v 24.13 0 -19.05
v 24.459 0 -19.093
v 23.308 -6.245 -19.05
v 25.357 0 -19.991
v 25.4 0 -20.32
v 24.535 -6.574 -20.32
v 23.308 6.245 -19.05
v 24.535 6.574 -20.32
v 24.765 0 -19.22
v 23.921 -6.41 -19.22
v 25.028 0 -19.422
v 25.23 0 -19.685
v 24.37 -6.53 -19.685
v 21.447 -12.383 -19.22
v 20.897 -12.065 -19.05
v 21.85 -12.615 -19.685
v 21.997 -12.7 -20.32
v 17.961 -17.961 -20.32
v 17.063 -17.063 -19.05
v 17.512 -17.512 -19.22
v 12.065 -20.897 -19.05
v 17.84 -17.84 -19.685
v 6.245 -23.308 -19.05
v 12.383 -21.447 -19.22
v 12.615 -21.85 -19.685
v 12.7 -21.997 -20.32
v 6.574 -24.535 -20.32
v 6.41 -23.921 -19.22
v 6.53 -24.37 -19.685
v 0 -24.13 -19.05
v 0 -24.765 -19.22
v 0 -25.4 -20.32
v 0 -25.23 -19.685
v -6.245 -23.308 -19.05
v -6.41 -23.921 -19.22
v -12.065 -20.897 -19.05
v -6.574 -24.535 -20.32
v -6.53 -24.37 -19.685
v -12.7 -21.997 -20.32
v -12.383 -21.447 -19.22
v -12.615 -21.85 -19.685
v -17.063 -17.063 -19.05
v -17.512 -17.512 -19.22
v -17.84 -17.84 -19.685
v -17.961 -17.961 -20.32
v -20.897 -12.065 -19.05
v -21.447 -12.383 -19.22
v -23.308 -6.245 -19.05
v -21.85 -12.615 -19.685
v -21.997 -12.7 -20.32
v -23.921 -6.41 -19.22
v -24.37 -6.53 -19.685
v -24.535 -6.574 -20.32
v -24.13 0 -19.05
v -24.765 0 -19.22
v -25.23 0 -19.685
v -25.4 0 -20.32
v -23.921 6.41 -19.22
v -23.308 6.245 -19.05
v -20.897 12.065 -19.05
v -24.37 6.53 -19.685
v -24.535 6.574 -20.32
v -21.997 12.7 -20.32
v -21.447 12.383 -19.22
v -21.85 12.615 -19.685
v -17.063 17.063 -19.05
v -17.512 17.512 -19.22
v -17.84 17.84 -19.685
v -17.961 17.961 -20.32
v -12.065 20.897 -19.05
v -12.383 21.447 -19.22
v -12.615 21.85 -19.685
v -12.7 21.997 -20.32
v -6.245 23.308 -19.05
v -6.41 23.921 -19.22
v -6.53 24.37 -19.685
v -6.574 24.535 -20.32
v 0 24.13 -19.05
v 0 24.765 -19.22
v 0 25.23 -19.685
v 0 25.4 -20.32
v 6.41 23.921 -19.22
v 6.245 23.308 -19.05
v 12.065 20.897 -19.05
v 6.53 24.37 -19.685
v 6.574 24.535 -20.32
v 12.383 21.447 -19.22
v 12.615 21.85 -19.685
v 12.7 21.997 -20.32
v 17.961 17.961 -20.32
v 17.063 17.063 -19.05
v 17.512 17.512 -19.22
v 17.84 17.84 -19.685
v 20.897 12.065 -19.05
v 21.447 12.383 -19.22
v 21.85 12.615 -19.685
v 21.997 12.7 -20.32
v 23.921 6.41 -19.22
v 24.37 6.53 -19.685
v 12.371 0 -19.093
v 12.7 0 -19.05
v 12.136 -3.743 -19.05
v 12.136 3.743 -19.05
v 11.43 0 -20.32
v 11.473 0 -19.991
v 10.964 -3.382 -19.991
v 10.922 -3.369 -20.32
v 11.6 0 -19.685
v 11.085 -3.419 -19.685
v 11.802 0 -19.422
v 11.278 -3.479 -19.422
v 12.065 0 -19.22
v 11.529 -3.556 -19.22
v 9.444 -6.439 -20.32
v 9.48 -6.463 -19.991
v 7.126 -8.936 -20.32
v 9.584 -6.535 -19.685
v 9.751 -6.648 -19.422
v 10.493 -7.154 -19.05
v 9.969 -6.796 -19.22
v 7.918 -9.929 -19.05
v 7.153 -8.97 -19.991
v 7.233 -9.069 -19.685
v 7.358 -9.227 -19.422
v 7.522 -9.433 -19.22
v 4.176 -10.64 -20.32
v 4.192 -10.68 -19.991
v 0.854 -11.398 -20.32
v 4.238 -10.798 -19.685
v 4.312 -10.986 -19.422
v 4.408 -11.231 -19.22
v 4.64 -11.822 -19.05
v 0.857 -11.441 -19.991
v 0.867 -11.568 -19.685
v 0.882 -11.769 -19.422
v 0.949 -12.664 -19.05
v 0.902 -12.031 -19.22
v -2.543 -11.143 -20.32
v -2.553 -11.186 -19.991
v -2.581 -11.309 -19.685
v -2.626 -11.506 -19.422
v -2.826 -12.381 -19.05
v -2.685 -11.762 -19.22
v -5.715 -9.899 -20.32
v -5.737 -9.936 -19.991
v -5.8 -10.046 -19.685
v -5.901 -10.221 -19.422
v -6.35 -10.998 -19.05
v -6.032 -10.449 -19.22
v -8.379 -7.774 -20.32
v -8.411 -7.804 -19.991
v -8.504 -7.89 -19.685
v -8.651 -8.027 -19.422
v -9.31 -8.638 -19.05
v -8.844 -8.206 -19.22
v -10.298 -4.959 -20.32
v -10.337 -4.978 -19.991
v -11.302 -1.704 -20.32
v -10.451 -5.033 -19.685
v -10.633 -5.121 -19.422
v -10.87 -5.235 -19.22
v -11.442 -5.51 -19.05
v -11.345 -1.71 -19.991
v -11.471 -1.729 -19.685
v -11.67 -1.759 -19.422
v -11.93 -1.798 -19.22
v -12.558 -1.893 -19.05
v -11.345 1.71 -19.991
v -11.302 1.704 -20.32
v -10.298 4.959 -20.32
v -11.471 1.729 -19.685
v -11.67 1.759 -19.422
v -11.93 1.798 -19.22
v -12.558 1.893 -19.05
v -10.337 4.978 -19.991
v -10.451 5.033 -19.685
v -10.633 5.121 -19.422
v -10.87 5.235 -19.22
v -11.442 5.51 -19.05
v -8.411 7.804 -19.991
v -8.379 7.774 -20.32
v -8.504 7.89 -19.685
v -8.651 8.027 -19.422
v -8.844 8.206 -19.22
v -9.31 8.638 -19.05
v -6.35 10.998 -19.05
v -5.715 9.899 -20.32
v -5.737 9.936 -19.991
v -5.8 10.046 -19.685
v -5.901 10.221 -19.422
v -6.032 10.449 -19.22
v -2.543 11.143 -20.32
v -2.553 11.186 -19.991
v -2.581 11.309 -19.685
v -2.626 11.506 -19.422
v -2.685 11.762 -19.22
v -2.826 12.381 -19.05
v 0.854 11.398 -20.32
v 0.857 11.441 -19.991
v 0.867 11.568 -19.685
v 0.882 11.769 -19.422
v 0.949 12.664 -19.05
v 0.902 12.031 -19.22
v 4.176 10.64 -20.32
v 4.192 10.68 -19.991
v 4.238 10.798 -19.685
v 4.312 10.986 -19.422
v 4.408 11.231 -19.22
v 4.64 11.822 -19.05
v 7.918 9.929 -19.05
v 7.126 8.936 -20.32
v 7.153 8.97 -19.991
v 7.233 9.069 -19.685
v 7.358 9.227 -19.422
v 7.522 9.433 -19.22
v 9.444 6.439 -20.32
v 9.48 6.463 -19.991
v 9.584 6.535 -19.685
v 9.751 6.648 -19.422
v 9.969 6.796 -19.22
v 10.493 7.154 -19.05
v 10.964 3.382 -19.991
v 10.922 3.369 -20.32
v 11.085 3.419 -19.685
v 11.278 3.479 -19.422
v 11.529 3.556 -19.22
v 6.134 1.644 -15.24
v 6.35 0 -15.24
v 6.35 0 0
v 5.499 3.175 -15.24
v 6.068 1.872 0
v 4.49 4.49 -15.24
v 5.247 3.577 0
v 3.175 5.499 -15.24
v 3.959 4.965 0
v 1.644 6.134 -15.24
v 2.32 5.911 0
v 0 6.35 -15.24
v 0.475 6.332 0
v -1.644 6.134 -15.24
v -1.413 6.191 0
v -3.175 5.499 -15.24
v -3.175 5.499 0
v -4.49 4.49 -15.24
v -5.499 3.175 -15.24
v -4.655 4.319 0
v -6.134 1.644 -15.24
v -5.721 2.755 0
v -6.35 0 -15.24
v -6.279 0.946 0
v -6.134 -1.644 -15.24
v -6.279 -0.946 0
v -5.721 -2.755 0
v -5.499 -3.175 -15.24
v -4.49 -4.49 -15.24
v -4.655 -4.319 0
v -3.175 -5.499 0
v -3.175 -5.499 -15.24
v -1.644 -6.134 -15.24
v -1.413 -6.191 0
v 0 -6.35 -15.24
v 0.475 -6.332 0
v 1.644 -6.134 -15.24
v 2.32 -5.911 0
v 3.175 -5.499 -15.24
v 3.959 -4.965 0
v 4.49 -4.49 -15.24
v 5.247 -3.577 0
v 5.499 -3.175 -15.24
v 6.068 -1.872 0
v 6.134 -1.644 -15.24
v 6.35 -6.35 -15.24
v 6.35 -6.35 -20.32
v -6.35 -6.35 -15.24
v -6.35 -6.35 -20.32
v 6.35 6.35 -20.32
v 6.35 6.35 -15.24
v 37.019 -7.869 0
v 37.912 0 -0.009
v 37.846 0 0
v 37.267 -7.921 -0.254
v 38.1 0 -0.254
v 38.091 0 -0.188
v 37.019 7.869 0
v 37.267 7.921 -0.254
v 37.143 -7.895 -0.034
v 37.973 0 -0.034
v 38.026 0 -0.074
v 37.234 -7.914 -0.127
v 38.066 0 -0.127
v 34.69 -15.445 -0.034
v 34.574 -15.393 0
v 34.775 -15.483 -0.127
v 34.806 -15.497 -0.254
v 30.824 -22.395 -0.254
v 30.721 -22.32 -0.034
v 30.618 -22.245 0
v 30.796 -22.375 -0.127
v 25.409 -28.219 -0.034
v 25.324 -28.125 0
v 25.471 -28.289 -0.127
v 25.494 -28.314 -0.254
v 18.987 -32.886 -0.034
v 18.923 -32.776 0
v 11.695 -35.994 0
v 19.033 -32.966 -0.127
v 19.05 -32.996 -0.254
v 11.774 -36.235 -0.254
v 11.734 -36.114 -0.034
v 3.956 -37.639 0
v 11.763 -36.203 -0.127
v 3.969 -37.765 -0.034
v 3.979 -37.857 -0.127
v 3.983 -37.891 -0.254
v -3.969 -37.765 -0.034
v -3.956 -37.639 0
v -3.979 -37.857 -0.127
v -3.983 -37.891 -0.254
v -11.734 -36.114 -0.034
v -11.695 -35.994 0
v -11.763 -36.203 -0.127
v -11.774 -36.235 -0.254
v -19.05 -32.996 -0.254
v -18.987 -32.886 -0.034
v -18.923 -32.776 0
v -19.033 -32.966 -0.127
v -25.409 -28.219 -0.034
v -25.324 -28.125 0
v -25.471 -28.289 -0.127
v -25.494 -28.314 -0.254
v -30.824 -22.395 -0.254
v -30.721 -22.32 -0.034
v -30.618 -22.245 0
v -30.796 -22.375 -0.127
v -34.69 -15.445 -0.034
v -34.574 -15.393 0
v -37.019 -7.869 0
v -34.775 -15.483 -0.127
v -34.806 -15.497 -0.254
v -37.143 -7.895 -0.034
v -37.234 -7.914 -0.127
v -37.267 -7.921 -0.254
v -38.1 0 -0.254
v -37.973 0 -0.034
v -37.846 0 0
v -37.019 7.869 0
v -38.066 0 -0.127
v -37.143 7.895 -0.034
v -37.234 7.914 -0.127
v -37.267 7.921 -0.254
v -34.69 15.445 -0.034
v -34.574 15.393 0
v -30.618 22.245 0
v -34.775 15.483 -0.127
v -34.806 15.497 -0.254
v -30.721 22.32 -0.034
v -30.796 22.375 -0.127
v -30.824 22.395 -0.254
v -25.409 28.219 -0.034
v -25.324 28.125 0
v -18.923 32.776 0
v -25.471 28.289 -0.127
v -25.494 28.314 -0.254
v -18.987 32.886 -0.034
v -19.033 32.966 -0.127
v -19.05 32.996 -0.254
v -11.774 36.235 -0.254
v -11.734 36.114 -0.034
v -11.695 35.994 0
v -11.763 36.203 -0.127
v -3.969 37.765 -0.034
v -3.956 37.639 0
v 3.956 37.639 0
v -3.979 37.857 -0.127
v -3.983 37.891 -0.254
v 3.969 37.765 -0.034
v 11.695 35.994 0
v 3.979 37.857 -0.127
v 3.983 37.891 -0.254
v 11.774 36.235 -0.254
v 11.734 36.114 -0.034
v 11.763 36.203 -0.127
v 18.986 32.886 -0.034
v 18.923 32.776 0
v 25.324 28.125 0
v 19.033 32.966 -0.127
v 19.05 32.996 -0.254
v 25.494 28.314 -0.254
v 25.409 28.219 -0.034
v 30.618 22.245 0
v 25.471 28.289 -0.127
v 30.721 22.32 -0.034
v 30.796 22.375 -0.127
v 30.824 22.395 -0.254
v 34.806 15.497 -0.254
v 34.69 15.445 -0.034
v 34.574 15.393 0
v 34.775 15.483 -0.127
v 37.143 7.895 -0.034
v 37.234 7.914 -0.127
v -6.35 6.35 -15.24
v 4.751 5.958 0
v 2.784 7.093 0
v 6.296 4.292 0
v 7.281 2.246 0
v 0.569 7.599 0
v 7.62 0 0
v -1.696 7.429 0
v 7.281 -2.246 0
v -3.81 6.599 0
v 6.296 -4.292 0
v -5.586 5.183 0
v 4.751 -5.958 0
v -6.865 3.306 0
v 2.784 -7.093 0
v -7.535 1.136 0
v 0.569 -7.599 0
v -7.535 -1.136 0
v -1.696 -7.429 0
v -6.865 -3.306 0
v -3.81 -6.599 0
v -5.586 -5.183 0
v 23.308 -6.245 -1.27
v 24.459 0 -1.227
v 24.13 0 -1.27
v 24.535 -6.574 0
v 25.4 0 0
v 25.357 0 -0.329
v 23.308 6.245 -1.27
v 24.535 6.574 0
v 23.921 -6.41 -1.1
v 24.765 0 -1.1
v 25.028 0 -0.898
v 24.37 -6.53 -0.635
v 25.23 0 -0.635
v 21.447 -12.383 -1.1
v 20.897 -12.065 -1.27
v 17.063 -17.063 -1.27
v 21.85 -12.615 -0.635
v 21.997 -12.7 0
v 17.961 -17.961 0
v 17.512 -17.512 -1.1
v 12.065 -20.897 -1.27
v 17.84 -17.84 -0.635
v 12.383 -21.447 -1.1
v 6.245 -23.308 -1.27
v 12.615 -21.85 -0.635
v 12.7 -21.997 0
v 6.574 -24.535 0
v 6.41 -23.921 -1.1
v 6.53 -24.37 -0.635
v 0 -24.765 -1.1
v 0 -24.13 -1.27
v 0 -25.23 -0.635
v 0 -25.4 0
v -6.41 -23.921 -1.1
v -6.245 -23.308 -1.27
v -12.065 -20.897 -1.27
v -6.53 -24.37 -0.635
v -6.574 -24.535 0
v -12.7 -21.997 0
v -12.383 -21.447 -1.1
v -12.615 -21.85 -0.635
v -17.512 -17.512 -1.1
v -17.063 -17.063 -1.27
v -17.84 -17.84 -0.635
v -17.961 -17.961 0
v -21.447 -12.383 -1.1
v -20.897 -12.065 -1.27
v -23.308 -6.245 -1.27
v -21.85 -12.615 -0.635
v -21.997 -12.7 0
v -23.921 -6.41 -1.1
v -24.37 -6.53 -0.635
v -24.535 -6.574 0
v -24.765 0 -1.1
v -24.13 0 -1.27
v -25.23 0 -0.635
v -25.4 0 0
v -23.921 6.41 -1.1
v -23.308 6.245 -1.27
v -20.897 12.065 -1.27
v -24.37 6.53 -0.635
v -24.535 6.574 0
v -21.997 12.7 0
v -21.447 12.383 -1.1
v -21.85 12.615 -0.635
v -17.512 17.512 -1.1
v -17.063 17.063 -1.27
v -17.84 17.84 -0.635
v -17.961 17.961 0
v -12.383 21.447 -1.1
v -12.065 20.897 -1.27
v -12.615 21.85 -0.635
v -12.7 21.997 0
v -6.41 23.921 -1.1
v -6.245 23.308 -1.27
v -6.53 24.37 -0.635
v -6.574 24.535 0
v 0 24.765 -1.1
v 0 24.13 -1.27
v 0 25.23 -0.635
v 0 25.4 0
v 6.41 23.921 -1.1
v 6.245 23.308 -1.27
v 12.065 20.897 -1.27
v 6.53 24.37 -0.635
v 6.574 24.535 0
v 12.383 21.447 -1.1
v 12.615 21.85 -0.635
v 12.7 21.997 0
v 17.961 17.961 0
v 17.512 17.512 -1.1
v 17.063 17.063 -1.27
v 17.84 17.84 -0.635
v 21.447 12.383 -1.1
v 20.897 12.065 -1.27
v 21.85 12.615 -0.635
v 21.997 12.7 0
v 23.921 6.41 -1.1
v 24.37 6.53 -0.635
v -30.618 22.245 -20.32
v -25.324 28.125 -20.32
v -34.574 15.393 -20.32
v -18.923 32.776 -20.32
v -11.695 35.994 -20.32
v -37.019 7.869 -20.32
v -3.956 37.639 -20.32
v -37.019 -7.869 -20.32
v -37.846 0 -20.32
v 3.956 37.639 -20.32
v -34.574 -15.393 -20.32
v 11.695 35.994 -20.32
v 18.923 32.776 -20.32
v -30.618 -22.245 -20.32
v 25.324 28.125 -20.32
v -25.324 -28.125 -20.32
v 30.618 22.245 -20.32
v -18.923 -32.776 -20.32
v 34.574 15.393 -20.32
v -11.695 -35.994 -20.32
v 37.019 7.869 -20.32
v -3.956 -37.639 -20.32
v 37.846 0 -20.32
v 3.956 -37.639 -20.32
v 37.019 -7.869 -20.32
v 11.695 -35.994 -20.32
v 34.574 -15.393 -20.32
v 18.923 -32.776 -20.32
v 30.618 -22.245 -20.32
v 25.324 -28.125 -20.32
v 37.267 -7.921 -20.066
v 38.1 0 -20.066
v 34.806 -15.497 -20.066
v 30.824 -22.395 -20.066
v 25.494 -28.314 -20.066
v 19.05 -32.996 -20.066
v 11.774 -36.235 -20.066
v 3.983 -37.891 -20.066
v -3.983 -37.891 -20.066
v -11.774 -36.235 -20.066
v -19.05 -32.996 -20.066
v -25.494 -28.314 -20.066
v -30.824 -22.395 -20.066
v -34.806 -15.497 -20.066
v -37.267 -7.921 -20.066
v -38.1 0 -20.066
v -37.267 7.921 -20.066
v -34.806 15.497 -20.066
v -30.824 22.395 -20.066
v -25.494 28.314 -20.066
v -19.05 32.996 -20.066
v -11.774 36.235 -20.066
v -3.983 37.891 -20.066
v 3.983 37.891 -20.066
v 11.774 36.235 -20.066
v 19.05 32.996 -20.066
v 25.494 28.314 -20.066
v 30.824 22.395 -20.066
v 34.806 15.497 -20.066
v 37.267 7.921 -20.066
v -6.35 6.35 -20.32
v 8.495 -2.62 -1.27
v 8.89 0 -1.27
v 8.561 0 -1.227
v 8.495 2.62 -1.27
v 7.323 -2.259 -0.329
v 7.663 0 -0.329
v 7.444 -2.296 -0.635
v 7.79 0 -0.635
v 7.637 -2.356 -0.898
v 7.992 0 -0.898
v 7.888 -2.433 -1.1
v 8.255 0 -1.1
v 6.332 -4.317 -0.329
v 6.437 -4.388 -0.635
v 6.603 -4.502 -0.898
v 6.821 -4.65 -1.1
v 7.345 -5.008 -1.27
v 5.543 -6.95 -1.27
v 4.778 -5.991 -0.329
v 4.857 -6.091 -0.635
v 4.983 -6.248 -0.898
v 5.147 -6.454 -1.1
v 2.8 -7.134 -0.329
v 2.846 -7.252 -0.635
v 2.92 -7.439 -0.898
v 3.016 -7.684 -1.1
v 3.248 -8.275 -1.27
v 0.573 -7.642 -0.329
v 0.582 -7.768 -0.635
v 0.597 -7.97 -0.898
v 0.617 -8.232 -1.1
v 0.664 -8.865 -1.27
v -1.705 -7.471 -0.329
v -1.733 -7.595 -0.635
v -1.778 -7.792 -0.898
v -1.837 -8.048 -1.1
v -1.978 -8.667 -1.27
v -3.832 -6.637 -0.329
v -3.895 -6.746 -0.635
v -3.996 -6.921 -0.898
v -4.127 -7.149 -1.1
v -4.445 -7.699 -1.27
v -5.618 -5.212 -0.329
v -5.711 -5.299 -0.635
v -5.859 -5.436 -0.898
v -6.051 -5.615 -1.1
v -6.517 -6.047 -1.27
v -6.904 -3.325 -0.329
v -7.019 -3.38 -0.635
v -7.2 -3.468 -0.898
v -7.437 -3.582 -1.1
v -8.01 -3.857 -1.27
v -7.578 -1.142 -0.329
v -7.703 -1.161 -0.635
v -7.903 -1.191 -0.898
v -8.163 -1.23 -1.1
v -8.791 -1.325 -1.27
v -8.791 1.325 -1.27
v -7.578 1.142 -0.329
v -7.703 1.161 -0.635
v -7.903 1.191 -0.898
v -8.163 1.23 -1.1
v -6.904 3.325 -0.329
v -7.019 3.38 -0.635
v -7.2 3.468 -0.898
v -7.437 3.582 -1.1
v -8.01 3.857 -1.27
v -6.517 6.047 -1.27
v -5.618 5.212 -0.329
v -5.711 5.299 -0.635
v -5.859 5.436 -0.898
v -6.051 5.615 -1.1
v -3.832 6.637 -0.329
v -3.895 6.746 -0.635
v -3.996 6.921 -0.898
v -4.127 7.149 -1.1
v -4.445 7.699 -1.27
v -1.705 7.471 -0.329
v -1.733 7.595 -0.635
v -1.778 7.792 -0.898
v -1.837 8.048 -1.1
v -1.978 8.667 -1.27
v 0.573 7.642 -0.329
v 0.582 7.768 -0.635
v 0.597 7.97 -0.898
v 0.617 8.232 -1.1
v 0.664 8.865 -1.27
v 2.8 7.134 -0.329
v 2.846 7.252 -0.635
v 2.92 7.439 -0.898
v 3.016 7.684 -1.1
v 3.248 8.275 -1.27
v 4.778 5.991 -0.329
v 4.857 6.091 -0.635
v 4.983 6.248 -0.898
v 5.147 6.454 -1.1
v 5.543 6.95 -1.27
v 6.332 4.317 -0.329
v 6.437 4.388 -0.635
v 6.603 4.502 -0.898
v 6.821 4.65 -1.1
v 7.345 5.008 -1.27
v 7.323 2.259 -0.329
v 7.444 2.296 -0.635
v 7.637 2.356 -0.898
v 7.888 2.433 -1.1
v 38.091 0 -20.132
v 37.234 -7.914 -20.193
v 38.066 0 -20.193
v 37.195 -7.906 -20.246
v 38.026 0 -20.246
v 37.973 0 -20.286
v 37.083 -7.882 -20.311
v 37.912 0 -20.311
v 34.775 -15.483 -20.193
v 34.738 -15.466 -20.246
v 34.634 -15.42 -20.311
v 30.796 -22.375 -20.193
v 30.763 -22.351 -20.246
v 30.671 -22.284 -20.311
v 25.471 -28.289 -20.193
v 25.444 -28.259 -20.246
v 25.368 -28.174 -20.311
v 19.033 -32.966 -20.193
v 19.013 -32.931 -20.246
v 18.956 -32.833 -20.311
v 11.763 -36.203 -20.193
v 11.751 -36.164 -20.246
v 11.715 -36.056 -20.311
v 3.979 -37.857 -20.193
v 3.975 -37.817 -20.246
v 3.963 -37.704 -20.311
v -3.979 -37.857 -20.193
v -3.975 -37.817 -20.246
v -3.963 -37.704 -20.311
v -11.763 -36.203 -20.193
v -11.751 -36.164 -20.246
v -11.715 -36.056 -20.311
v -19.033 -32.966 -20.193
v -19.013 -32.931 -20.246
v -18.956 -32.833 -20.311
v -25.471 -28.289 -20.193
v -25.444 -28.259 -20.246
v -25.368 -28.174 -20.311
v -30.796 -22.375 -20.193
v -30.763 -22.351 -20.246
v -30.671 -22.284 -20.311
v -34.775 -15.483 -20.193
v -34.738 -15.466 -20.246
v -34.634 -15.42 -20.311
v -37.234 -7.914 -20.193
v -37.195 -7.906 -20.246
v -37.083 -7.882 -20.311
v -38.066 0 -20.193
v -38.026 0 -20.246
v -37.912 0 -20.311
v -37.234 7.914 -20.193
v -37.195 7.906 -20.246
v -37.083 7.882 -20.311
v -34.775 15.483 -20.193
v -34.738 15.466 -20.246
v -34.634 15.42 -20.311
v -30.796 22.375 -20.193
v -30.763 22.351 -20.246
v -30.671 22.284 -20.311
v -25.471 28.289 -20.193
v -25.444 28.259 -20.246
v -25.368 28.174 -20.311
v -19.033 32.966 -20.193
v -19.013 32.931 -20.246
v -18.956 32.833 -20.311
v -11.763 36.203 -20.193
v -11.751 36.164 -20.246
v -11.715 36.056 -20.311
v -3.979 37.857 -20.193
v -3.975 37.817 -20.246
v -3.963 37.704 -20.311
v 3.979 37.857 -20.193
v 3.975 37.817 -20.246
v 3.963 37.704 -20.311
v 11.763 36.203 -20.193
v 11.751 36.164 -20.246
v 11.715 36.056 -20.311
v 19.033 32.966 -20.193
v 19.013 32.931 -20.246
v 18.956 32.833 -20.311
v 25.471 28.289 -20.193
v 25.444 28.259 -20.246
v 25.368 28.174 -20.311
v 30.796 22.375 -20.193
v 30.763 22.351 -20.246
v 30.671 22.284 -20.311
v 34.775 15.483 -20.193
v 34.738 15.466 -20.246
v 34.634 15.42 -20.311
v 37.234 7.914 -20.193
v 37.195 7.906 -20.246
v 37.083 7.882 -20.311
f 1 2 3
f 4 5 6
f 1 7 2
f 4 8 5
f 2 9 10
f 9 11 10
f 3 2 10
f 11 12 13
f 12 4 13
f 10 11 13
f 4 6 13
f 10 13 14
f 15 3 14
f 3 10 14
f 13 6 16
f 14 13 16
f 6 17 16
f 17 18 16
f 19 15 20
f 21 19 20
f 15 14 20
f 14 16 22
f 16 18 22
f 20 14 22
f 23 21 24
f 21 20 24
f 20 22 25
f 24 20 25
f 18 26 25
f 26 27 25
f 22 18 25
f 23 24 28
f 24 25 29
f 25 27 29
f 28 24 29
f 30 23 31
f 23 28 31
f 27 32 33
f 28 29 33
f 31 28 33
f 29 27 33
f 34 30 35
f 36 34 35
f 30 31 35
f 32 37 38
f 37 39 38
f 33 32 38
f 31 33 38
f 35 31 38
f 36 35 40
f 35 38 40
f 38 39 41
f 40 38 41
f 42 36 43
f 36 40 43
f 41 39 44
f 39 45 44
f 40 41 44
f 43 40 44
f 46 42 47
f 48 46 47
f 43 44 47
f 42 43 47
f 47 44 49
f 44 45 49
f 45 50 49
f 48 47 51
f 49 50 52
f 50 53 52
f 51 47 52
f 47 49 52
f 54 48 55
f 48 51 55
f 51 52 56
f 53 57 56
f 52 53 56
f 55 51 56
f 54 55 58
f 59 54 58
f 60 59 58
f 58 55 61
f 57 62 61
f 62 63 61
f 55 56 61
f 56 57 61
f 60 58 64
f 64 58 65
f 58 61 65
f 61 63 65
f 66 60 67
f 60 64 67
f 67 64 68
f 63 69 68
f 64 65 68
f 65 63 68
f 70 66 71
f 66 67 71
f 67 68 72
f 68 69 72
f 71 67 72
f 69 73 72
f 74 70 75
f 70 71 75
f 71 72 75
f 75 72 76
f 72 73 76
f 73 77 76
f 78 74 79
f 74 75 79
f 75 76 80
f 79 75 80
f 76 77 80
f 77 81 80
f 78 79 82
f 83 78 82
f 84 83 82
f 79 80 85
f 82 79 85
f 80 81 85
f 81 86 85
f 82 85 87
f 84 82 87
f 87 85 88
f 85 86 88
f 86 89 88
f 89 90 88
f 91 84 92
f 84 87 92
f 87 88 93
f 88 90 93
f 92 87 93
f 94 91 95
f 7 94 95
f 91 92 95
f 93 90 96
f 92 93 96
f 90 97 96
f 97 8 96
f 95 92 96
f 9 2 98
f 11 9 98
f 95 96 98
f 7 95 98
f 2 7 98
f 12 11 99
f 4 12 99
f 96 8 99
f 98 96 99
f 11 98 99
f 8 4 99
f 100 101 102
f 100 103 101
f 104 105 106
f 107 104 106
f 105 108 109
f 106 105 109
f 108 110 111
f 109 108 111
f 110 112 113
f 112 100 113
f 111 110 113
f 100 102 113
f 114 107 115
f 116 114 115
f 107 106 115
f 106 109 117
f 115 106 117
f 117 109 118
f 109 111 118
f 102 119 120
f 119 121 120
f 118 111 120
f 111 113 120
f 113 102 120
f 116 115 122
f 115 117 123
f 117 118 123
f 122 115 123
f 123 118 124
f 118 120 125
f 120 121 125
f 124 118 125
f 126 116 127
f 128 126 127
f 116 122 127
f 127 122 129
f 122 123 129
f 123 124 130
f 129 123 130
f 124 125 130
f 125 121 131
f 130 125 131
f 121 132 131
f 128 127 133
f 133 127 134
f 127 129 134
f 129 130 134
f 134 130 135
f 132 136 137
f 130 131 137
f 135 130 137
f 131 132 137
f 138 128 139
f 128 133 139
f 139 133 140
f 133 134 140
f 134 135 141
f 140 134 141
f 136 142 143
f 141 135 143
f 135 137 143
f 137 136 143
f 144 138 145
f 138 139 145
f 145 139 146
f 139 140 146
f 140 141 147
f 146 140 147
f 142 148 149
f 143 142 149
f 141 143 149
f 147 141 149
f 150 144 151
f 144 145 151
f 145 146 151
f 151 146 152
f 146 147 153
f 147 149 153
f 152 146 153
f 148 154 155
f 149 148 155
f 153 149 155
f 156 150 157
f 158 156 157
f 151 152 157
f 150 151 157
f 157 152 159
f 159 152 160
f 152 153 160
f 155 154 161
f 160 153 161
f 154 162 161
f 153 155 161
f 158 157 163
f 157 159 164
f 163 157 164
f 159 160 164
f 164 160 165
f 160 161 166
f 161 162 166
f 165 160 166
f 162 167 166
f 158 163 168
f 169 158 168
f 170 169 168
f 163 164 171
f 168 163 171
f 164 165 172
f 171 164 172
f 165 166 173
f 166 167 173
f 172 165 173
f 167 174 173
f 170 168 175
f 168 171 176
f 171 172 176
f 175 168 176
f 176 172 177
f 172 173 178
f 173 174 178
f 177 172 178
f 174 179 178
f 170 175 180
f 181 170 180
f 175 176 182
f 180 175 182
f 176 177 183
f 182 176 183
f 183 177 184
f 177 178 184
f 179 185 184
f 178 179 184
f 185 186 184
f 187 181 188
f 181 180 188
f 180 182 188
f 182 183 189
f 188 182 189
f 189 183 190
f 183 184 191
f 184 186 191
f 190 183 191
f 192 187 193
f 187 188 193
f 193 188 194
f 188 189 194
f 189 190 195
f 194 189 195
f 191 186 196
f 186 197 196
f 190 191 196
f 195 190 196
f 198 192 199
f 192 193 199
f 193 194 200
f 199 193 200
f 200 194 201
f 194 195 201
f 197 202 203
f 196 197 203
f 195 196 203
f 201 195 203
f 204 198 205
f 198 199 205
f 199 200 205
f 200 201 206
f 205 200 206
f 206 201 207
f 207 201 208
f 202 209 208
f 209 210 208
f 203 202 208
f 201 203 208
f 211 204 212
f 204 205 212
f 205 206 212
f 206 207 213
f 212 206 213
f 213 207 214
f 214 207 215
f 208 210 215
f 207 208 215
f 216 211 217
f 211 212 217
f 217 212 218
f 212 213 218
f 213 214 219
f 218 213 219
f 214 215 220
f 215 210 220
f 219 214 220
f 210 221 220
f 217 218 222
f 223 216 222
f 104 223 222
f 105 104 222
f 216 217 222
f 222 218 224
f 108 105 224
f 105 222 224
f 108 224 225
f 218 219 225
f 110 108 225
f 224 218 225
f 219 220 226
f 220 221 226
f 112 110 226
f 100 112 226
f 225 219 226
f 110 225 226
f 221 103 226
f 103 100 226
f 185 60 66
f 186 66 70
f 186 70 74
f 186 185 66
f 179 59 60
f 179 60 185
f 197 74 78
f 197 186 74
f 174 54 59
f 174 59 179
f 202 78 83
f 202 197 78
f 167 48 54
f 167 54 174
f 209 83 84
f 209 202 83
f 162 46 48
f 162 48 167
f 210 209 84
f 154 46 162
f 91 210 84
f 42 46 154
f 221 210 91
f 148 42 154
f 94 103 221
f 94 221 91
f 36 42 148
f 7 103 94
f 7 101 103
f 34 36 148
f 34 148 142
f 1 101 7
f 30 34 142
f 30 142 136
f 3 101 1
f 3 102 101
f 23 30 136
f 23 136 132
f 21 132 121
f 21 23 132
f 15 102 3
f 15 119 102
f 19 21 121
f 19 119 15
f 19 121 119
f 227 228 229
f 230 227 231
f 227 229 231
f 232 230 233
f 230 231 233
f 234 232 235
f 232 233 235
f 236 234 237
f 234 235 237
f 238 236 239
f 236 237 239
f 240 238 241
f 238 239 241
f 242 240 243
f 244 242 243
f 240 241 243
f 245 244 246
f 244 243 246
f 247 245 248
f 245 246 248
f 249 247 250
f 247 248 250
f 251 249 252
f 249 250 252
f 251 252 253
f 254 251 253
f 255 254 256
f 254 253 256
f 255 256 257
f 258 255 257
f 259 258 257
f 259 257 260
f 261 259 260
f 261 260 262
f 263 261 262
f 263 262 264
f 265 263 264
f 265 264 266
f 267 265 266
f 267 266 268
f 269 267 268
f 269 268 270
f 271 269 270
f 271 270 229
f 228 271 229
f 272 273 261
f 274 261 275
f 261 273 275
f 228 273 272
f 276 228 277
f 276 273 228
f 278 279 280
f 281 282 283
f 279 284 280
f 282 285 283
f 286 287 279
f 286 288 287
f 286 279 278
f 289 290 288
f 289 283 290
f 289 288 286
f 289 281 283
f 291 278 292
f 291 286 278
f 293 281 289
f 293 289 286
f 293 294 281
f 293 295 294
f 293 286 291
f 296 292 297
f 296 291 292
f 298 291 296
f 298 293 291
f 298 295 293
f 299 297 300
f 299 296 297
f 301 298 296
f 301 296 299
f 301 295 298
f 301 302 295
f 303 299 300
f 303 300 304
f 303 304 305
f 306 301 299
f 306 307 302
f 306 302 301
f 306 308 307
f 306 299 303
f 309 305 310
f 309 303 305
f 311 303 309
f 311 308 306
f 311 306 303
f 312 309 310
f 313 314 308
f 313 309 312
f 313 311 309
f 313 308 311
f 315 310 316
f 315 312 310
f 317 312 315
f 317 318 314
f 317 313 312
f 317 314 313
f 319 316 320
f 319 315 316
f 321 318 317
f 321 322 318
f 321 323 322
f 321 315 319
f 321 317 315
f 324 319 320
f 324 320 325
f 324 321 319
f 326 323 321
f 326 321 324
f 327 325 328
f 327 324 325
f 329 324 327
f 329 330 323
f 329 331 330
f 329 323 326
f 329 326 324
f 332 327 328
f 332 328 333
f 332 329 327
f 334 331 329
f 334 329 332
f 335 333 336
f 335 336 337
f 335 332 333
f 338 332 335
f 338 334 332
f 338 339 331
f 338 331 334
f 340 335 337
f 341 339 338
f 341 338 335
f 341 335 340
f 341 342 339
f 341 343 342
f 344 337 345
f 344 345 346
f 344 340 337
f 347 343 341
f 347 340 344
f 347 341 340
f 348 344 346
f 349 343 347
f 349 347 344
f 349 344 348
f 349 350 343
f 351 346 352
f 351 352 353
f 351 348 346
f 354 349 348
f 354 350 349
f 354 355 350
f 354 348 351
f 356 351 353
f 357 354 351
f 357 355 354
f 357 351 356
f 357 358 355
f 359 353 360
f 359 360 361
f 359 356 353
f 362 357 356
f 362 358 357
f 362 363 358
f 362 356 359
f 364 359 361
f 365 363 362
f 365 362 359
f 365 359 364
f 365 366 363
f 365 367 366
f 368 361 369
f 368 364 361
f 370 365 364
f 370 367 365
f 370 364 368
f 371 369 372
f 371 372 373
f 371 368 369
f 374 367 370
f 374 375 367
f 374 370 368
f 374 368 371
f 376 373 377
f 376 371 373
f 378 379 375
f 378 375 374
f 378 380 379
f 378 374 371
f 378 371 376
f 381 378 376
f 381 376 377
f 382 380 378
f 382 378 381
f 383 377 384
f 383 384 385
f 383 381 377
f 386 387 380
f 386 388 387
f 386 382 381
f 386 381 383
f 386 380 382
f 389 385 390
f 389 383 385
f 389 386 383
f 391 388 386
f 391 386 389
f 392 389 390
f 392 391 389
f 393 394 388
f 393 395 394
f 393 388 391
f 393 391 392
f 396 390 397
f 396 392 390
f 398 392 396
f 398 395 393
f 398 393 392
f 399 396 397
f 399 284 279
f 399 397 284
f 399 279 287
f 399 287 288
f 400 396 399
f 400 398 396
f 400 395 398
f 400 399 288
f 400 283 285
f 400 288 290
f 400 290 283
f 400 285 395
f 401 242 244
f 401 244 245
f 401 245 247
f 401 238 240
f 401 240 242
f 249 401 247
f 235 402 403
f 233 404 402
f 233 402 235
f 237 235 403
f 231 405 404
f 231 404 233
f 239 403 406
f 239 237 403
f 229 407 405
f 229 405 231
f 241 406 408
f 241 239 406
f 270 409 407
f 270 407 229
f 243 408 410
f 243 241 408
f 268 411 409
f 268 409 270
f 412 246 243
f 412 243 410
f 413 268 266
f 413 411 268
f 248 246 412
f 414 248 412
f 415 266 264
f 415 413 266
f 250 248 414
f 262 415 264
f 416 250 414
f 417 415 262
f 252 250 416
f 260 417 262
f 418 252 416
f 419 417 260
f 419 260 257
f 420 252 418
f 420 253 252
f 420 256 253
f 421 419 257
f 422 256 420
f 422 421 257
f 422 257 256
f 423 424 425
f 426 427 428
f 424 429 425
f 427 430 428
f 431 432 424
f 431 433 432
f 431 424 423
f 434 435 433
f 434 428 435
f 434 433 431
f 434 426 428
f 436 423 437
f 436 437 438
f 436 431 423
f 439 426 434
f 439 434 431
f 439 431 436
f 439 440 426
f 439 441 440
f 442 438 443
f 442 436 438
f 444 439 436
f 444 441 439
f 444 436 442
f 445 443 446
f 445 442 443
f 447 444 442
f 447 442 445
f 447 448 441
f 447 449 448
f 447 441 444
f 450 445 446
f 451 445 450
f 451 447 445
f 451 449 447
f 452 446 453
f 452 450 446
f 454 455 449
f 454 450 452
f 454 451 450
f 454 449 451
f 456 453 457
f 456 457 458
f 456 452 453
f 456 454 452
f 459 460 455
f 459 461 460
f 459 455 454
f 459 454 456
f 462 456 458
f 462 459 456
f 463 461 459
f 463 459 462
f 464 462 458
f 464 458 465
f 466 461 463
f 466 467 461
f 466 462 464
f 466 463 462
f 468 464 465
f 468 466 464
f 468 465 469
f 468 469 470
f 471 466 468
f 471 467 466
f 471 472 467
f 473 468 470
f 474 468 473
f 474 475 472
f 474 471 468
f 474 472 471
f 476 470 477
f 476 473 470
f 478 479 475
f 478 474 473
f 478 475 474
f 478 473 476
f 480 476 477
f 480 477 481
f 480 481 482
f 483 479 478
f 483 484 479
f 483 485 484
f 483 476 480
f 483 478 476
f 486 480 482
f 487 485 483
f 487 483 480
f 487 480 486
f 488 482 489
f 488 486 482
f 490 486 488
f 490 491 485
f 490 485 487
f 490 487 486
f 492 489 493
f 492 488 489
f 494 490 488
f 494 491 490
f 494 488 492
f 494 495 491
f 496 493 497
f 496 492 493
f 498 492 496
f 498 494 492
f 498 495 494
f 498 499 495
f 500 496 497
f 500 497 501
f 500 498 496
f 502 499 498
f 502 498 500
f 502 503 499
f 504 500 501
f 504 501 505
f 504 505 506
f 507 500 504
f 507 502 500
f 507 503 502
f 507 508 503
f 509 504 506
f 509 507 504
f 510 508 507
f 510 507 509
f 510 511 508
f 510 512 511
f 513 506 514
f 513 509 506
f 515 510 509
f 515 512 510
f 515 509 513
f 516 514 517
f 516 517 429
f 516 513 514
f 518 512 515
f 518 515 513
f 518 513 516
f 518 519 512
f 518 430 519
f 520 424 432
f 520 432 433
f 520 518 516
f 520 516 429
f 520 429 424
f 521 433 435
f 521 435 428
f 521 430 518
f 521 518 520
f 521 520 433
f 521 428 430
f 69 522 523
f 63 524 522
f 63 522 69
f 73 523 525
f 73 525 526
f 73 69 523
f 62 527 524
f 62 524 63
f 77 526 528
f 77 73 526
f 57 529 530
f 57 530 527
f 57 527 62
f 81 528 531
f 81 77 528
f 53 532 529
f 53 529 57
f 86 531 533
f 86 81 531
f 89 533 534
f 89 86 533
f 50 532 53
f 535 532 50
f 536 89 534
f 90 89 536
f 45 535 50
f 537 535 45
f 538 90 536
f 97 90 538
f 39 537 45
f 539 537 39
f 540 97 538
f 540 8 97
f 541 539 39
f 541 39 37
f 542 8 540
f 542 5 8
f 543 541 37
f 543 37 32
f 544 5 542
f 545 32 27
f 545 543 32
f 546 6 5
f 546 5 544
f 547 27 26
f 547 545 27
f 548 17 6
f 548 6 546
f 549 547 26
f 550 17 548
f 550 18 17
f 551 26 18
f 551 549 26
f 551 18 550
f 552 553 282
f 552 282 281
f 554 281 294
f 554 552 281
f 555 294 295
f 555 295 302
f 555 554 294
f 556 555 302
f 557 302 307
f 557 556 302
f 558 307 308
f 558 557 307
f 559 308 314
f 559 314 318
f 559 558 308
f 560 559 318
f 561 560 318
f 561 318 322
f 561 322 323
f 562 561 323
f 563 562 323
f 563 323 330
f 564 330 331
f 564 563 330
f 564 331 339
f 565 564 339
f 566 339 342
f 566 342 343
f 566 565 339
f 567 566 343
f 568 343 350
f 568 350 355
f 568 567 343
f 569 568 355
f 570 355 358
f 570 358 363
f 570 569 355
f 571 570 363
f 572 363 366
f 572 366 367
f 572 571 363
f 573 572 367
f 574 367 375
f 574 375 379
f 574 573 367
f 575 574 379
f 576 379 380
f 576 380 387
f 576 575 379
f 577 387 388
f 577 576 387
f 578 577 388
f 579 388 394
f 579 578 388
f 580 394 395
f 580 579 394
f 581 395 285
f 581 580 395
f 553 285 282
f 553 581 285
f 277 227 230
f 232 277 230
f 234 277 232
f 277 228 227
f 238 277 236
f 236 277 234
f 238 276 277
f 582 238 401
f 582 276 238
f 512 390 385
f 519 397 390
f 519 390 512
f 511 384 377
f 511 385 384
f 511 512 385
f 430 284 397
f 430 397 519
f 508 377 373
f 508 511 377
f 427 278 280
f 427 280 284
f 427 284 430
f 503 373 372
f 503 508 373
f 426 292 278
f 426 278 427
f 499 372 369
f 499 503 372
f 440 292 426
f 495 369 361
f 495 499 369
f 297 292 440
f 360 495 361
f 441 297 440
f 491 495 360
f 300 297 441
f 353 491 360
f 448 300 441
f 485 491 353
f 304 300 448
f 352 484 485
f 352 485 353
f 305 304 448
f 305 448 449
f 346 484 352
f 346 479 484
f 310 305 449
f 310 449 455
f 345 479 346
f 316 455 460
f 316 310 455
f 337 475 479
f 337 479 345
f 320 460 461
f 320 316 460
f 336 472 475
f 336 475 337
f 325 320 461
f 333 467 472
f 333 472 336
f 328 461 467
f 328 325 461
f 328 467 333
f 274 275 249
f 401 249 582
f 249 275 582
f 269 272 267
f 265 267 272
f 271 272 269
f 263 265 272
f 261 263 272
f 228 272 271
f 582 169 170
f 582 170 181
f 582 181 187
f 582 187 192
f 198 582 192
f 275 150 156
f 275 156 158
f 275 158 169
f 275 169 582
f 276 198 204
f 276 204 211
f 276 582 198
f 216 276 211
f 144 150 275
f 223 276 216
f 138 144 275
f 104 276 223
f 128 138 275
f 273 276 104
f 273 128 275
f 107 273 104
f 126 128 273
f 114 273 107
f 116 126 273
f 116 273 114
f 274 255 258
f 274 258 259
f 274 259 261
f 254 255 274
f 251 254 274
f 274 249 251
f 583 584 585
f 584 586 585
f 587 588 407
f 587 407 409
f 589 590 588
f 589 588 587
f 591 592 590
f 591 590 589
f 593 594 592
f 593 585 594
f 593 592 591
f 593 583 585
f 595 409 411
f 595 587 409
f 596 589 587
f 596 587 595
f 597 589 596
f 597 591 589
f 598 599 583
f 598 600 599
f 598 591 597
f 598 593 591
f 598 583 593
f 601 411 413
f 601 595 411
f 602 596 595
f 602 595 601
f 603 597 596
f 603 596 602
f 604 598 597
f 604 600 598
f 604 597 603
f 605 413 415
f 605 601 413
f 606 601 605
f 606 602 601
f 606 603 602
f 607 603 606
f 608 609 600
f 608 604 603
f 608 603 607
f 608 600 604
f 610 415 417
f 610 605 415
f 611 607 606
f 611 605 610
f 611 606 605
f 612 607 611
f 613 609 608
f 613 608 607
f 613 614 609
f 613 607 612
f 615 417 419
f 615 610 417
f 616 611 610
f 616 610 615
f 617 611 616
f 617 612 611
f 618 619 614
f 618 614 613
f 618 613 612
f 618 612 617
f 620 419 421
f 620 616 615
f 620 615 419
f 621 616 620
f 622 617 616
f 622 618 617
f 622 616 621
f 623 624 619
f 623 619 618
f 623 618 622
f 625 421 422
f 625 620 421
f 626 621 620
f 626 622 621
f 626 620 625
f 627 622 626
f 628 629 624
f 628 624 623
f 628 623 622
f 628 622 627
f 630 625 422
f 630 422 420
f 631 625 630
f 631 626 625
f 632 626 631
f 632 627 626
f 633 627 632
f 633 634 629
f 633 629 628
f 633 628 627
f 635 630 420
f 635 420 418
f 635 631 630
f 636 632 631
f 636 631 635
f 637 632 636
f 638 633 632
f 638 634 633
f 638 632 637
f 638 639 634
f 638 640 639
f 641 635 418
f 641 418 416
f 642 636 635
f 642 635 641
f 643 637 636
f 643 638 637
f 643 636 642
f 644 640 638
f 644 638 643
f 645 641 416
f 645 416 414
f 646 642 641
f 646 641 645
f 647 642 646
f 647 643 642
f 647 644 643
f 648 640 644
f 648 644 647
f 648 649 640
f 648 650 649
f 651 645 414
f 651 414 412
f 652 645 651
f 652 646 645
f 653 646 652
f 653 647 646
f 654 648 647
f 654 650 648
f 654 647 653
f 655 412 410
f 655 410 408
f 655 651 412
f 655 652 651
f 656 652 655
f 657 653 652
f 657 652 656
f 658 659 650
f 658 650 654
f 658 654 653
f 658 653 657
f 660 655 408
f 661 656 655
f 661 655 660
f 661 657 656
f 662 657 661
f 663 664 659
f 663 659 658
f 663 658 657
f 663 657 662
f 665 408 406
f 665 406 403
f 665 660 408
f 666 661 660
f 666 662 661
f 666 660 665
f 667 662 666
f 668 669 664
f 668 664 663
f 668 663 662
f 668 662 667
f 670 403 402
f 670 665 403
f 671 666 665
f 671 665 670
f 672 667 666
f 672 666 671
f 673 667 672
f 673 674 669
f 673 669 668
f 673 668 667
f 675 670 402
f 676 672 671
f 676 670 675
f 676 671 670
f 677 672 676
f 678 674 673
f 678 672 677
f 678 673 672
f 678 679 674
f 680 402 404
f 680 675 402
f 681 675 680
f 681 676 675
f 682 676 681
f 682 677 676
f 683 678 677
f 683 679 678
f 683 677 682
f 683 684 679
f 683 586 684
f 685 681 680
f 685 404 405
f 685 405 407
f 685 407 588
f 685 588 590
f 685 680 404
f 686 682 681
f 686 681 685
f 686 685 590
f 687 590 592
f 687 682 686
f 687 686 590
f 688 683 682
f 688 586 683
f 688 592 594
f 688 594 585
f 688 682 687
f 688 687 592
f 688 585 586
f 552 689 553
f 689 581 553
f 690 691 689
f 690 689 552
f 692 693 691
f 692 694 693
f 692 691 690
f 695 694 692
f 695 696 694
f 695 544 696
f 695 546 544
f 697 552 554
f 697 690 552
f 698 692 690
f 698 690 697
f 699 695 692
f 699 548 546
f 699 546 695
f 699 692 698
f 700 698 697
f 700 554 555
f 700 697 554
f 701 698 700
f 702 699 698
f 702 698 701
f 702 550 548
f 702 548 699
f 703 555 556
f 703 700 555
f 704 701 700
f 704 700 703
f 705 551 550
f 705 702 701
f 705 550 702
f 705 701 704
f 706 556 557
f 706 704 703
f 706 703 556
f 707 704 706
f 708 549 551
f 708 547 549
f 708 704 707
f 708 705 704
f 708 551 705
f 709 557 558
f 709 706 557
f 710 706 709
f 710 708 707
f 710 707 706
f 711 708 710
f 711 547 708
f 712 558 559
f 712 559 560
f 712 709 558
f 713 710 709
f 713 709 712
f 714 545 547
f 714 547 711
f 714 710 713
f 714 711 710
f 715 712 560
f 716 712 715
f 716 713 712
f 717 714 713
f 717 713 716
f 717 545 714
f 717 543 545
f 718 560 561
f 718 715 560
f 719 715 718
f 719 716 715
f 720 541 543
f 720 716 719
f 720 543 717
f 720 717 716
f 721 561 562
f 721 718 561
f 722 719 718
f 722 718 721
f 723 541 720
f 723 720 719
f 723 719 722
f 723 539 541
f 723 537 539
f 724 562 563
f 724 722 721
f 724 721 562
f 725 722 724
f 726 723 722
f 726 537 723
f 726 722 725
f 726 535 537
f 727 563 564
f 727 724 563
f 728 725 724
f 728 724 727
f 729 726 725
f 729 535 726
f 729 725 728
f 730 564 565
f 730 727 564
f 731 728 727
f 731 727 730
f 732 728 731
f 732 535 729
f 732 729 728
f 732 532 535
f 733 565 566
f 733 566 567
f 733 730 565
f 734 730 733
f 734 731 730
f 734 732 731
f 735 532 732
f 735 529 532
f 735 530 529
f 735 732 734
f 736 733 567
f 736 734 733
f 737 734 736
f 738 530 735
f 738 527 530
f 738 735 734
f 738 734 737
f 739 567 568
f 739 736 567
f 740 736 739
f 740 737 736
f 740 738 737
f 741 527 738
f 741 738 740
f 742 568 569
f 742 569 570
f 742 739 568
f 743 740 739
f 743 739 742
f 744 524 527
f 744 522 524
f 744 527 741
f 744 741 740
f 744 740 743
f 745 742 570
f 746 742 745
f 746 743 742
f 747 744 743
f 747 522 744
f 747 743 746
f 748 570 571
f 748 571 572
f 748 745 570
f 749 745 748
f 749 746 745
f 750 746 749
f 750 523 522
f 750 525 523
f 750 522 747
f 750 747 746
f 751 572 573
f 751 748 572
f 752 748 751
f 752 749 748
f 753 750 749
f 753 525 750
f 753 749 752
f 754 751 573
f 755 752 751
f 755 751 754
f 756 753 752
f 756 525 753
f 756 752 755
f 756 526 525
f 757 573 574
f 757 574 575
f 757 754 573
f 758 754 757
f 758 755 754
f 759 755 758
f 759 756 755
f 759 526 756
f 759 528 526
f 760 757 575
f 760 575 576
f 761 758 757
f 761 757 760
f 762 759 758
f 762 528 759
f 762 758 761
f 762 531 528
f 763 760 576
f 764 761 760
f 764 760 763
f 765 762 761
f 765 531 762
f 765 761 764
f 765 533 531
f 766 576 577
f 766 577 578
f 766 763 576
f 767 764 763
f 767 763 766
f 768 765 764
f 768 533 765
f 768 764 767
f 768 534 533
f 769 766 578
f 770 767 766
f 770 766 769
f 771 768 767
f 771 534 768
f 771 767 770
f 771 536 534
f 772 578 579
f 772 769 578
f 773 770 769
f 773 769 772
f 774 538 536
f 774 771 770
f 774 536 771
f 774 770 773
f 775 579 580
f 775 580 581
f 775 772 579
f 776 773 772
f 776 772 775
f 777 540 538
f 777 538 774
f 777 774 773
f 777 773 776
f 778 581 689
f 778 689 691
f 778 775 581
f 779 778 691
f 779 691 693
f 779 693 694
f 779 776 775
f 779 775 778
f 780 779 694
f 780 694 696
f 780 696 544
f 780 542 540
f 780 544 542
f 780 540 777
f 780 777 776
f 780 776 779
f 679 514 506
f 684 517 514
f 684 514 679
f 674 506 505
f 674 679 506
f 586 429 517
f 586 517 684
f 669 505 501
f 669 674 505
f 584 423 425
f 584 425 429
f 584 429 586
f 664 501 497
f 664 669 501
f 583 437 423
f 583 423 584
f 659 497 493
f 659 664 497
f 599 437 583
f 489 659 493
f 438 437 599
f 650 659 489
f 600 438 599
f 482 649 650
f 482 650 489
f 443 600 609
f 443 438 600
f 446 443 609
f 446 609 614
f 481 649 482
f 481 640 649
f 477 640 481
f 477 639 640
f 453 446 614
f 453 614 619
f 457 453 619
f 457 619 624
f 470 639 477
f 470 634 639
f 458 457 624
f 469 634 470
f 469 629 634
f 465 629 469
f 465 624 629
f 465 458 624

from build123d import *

# Parameters (mm, degrees)
SKETCH3_R          = 6.35
CUT_EXTRUDE1_DEPTH = 58.585782968
FILLET1_R          = 1.27
FILLET2_R          = 0.254
SKETCH4_W          = 12.7
SKETCH4_H          = 12.7
CUT_EXTRUDE2_DEPTH = 5.08


with BuildPart() as part:
    # Sketch2 → Revolve1 (revolve)
    with BuildSketch(Plane(origin=(0, 0, 0), x_dir=(0, 0, -1), z_dir=(1, 0, 0)), mode=Mode.PRIVATE) as revolve1_sk:
        Polygon((0, -7.62), (1.27, -7.62), (1.27, -25.4), (0, -25.4), (0, -38.1), (20.32, -38.1), (20.32, -25.4), (19.05, -25.4), (19.05, -11.43), (20.32, -11.43), (20.32, 0), (0, 0), align=None)
    revolve(revolve1_sk.sketch.rotate(Axis((0, 0, 0), (0, 0, -1)), 270), axis=Axis((0, 0, 0), (0, 0, -1)))

    # Sketch3 → Cut-Extrude1 (cut, through all)
    with BuildSketch(Plane.XY):
        Circle(SKETCH3_R)
    extrude(amount=-CUT_EXTRUDE1_DEPTH, mode=Mode.SUBTRACT)

    # Fillet1
    fillet1_edges = [part.edges().sort_by_distance(p)[0] for p in [
        (-25.4, 0, -19.05),
        (-25.4, 0, -1.27),
        (-7.62, 0, -1.27),
        (-11.43, 0, -19.05),
    ]]
    fillet(fillet1_edges, radius=FILLET1_R - 0.0001)  # a hair under: the kernel refuses the full size

    # Fillet2
    fillet2_edges = [part.edges().sort_by_distance(p)[0] for p in [
        (-38.1, 0, -20.32),
        (-38.1, 0, 0),
    ]]
    fillet(fillet2_edges, radius=FILLET2_R)

    # Sketch4 → Cut-Extrude2 (cut)
    with BuildSketch(Plane(origin=(0, 0, -20.32), x_dir=(-1, 0, 0), z_dir=(0, 0, -1))):
        Rectangle(SKETCH4_W, SKETCH4_H)
    extrude(amount=-CUT_EXTRUDE2_DEPTH, mode=Mode.SUBTRACT)


solid = part.part
